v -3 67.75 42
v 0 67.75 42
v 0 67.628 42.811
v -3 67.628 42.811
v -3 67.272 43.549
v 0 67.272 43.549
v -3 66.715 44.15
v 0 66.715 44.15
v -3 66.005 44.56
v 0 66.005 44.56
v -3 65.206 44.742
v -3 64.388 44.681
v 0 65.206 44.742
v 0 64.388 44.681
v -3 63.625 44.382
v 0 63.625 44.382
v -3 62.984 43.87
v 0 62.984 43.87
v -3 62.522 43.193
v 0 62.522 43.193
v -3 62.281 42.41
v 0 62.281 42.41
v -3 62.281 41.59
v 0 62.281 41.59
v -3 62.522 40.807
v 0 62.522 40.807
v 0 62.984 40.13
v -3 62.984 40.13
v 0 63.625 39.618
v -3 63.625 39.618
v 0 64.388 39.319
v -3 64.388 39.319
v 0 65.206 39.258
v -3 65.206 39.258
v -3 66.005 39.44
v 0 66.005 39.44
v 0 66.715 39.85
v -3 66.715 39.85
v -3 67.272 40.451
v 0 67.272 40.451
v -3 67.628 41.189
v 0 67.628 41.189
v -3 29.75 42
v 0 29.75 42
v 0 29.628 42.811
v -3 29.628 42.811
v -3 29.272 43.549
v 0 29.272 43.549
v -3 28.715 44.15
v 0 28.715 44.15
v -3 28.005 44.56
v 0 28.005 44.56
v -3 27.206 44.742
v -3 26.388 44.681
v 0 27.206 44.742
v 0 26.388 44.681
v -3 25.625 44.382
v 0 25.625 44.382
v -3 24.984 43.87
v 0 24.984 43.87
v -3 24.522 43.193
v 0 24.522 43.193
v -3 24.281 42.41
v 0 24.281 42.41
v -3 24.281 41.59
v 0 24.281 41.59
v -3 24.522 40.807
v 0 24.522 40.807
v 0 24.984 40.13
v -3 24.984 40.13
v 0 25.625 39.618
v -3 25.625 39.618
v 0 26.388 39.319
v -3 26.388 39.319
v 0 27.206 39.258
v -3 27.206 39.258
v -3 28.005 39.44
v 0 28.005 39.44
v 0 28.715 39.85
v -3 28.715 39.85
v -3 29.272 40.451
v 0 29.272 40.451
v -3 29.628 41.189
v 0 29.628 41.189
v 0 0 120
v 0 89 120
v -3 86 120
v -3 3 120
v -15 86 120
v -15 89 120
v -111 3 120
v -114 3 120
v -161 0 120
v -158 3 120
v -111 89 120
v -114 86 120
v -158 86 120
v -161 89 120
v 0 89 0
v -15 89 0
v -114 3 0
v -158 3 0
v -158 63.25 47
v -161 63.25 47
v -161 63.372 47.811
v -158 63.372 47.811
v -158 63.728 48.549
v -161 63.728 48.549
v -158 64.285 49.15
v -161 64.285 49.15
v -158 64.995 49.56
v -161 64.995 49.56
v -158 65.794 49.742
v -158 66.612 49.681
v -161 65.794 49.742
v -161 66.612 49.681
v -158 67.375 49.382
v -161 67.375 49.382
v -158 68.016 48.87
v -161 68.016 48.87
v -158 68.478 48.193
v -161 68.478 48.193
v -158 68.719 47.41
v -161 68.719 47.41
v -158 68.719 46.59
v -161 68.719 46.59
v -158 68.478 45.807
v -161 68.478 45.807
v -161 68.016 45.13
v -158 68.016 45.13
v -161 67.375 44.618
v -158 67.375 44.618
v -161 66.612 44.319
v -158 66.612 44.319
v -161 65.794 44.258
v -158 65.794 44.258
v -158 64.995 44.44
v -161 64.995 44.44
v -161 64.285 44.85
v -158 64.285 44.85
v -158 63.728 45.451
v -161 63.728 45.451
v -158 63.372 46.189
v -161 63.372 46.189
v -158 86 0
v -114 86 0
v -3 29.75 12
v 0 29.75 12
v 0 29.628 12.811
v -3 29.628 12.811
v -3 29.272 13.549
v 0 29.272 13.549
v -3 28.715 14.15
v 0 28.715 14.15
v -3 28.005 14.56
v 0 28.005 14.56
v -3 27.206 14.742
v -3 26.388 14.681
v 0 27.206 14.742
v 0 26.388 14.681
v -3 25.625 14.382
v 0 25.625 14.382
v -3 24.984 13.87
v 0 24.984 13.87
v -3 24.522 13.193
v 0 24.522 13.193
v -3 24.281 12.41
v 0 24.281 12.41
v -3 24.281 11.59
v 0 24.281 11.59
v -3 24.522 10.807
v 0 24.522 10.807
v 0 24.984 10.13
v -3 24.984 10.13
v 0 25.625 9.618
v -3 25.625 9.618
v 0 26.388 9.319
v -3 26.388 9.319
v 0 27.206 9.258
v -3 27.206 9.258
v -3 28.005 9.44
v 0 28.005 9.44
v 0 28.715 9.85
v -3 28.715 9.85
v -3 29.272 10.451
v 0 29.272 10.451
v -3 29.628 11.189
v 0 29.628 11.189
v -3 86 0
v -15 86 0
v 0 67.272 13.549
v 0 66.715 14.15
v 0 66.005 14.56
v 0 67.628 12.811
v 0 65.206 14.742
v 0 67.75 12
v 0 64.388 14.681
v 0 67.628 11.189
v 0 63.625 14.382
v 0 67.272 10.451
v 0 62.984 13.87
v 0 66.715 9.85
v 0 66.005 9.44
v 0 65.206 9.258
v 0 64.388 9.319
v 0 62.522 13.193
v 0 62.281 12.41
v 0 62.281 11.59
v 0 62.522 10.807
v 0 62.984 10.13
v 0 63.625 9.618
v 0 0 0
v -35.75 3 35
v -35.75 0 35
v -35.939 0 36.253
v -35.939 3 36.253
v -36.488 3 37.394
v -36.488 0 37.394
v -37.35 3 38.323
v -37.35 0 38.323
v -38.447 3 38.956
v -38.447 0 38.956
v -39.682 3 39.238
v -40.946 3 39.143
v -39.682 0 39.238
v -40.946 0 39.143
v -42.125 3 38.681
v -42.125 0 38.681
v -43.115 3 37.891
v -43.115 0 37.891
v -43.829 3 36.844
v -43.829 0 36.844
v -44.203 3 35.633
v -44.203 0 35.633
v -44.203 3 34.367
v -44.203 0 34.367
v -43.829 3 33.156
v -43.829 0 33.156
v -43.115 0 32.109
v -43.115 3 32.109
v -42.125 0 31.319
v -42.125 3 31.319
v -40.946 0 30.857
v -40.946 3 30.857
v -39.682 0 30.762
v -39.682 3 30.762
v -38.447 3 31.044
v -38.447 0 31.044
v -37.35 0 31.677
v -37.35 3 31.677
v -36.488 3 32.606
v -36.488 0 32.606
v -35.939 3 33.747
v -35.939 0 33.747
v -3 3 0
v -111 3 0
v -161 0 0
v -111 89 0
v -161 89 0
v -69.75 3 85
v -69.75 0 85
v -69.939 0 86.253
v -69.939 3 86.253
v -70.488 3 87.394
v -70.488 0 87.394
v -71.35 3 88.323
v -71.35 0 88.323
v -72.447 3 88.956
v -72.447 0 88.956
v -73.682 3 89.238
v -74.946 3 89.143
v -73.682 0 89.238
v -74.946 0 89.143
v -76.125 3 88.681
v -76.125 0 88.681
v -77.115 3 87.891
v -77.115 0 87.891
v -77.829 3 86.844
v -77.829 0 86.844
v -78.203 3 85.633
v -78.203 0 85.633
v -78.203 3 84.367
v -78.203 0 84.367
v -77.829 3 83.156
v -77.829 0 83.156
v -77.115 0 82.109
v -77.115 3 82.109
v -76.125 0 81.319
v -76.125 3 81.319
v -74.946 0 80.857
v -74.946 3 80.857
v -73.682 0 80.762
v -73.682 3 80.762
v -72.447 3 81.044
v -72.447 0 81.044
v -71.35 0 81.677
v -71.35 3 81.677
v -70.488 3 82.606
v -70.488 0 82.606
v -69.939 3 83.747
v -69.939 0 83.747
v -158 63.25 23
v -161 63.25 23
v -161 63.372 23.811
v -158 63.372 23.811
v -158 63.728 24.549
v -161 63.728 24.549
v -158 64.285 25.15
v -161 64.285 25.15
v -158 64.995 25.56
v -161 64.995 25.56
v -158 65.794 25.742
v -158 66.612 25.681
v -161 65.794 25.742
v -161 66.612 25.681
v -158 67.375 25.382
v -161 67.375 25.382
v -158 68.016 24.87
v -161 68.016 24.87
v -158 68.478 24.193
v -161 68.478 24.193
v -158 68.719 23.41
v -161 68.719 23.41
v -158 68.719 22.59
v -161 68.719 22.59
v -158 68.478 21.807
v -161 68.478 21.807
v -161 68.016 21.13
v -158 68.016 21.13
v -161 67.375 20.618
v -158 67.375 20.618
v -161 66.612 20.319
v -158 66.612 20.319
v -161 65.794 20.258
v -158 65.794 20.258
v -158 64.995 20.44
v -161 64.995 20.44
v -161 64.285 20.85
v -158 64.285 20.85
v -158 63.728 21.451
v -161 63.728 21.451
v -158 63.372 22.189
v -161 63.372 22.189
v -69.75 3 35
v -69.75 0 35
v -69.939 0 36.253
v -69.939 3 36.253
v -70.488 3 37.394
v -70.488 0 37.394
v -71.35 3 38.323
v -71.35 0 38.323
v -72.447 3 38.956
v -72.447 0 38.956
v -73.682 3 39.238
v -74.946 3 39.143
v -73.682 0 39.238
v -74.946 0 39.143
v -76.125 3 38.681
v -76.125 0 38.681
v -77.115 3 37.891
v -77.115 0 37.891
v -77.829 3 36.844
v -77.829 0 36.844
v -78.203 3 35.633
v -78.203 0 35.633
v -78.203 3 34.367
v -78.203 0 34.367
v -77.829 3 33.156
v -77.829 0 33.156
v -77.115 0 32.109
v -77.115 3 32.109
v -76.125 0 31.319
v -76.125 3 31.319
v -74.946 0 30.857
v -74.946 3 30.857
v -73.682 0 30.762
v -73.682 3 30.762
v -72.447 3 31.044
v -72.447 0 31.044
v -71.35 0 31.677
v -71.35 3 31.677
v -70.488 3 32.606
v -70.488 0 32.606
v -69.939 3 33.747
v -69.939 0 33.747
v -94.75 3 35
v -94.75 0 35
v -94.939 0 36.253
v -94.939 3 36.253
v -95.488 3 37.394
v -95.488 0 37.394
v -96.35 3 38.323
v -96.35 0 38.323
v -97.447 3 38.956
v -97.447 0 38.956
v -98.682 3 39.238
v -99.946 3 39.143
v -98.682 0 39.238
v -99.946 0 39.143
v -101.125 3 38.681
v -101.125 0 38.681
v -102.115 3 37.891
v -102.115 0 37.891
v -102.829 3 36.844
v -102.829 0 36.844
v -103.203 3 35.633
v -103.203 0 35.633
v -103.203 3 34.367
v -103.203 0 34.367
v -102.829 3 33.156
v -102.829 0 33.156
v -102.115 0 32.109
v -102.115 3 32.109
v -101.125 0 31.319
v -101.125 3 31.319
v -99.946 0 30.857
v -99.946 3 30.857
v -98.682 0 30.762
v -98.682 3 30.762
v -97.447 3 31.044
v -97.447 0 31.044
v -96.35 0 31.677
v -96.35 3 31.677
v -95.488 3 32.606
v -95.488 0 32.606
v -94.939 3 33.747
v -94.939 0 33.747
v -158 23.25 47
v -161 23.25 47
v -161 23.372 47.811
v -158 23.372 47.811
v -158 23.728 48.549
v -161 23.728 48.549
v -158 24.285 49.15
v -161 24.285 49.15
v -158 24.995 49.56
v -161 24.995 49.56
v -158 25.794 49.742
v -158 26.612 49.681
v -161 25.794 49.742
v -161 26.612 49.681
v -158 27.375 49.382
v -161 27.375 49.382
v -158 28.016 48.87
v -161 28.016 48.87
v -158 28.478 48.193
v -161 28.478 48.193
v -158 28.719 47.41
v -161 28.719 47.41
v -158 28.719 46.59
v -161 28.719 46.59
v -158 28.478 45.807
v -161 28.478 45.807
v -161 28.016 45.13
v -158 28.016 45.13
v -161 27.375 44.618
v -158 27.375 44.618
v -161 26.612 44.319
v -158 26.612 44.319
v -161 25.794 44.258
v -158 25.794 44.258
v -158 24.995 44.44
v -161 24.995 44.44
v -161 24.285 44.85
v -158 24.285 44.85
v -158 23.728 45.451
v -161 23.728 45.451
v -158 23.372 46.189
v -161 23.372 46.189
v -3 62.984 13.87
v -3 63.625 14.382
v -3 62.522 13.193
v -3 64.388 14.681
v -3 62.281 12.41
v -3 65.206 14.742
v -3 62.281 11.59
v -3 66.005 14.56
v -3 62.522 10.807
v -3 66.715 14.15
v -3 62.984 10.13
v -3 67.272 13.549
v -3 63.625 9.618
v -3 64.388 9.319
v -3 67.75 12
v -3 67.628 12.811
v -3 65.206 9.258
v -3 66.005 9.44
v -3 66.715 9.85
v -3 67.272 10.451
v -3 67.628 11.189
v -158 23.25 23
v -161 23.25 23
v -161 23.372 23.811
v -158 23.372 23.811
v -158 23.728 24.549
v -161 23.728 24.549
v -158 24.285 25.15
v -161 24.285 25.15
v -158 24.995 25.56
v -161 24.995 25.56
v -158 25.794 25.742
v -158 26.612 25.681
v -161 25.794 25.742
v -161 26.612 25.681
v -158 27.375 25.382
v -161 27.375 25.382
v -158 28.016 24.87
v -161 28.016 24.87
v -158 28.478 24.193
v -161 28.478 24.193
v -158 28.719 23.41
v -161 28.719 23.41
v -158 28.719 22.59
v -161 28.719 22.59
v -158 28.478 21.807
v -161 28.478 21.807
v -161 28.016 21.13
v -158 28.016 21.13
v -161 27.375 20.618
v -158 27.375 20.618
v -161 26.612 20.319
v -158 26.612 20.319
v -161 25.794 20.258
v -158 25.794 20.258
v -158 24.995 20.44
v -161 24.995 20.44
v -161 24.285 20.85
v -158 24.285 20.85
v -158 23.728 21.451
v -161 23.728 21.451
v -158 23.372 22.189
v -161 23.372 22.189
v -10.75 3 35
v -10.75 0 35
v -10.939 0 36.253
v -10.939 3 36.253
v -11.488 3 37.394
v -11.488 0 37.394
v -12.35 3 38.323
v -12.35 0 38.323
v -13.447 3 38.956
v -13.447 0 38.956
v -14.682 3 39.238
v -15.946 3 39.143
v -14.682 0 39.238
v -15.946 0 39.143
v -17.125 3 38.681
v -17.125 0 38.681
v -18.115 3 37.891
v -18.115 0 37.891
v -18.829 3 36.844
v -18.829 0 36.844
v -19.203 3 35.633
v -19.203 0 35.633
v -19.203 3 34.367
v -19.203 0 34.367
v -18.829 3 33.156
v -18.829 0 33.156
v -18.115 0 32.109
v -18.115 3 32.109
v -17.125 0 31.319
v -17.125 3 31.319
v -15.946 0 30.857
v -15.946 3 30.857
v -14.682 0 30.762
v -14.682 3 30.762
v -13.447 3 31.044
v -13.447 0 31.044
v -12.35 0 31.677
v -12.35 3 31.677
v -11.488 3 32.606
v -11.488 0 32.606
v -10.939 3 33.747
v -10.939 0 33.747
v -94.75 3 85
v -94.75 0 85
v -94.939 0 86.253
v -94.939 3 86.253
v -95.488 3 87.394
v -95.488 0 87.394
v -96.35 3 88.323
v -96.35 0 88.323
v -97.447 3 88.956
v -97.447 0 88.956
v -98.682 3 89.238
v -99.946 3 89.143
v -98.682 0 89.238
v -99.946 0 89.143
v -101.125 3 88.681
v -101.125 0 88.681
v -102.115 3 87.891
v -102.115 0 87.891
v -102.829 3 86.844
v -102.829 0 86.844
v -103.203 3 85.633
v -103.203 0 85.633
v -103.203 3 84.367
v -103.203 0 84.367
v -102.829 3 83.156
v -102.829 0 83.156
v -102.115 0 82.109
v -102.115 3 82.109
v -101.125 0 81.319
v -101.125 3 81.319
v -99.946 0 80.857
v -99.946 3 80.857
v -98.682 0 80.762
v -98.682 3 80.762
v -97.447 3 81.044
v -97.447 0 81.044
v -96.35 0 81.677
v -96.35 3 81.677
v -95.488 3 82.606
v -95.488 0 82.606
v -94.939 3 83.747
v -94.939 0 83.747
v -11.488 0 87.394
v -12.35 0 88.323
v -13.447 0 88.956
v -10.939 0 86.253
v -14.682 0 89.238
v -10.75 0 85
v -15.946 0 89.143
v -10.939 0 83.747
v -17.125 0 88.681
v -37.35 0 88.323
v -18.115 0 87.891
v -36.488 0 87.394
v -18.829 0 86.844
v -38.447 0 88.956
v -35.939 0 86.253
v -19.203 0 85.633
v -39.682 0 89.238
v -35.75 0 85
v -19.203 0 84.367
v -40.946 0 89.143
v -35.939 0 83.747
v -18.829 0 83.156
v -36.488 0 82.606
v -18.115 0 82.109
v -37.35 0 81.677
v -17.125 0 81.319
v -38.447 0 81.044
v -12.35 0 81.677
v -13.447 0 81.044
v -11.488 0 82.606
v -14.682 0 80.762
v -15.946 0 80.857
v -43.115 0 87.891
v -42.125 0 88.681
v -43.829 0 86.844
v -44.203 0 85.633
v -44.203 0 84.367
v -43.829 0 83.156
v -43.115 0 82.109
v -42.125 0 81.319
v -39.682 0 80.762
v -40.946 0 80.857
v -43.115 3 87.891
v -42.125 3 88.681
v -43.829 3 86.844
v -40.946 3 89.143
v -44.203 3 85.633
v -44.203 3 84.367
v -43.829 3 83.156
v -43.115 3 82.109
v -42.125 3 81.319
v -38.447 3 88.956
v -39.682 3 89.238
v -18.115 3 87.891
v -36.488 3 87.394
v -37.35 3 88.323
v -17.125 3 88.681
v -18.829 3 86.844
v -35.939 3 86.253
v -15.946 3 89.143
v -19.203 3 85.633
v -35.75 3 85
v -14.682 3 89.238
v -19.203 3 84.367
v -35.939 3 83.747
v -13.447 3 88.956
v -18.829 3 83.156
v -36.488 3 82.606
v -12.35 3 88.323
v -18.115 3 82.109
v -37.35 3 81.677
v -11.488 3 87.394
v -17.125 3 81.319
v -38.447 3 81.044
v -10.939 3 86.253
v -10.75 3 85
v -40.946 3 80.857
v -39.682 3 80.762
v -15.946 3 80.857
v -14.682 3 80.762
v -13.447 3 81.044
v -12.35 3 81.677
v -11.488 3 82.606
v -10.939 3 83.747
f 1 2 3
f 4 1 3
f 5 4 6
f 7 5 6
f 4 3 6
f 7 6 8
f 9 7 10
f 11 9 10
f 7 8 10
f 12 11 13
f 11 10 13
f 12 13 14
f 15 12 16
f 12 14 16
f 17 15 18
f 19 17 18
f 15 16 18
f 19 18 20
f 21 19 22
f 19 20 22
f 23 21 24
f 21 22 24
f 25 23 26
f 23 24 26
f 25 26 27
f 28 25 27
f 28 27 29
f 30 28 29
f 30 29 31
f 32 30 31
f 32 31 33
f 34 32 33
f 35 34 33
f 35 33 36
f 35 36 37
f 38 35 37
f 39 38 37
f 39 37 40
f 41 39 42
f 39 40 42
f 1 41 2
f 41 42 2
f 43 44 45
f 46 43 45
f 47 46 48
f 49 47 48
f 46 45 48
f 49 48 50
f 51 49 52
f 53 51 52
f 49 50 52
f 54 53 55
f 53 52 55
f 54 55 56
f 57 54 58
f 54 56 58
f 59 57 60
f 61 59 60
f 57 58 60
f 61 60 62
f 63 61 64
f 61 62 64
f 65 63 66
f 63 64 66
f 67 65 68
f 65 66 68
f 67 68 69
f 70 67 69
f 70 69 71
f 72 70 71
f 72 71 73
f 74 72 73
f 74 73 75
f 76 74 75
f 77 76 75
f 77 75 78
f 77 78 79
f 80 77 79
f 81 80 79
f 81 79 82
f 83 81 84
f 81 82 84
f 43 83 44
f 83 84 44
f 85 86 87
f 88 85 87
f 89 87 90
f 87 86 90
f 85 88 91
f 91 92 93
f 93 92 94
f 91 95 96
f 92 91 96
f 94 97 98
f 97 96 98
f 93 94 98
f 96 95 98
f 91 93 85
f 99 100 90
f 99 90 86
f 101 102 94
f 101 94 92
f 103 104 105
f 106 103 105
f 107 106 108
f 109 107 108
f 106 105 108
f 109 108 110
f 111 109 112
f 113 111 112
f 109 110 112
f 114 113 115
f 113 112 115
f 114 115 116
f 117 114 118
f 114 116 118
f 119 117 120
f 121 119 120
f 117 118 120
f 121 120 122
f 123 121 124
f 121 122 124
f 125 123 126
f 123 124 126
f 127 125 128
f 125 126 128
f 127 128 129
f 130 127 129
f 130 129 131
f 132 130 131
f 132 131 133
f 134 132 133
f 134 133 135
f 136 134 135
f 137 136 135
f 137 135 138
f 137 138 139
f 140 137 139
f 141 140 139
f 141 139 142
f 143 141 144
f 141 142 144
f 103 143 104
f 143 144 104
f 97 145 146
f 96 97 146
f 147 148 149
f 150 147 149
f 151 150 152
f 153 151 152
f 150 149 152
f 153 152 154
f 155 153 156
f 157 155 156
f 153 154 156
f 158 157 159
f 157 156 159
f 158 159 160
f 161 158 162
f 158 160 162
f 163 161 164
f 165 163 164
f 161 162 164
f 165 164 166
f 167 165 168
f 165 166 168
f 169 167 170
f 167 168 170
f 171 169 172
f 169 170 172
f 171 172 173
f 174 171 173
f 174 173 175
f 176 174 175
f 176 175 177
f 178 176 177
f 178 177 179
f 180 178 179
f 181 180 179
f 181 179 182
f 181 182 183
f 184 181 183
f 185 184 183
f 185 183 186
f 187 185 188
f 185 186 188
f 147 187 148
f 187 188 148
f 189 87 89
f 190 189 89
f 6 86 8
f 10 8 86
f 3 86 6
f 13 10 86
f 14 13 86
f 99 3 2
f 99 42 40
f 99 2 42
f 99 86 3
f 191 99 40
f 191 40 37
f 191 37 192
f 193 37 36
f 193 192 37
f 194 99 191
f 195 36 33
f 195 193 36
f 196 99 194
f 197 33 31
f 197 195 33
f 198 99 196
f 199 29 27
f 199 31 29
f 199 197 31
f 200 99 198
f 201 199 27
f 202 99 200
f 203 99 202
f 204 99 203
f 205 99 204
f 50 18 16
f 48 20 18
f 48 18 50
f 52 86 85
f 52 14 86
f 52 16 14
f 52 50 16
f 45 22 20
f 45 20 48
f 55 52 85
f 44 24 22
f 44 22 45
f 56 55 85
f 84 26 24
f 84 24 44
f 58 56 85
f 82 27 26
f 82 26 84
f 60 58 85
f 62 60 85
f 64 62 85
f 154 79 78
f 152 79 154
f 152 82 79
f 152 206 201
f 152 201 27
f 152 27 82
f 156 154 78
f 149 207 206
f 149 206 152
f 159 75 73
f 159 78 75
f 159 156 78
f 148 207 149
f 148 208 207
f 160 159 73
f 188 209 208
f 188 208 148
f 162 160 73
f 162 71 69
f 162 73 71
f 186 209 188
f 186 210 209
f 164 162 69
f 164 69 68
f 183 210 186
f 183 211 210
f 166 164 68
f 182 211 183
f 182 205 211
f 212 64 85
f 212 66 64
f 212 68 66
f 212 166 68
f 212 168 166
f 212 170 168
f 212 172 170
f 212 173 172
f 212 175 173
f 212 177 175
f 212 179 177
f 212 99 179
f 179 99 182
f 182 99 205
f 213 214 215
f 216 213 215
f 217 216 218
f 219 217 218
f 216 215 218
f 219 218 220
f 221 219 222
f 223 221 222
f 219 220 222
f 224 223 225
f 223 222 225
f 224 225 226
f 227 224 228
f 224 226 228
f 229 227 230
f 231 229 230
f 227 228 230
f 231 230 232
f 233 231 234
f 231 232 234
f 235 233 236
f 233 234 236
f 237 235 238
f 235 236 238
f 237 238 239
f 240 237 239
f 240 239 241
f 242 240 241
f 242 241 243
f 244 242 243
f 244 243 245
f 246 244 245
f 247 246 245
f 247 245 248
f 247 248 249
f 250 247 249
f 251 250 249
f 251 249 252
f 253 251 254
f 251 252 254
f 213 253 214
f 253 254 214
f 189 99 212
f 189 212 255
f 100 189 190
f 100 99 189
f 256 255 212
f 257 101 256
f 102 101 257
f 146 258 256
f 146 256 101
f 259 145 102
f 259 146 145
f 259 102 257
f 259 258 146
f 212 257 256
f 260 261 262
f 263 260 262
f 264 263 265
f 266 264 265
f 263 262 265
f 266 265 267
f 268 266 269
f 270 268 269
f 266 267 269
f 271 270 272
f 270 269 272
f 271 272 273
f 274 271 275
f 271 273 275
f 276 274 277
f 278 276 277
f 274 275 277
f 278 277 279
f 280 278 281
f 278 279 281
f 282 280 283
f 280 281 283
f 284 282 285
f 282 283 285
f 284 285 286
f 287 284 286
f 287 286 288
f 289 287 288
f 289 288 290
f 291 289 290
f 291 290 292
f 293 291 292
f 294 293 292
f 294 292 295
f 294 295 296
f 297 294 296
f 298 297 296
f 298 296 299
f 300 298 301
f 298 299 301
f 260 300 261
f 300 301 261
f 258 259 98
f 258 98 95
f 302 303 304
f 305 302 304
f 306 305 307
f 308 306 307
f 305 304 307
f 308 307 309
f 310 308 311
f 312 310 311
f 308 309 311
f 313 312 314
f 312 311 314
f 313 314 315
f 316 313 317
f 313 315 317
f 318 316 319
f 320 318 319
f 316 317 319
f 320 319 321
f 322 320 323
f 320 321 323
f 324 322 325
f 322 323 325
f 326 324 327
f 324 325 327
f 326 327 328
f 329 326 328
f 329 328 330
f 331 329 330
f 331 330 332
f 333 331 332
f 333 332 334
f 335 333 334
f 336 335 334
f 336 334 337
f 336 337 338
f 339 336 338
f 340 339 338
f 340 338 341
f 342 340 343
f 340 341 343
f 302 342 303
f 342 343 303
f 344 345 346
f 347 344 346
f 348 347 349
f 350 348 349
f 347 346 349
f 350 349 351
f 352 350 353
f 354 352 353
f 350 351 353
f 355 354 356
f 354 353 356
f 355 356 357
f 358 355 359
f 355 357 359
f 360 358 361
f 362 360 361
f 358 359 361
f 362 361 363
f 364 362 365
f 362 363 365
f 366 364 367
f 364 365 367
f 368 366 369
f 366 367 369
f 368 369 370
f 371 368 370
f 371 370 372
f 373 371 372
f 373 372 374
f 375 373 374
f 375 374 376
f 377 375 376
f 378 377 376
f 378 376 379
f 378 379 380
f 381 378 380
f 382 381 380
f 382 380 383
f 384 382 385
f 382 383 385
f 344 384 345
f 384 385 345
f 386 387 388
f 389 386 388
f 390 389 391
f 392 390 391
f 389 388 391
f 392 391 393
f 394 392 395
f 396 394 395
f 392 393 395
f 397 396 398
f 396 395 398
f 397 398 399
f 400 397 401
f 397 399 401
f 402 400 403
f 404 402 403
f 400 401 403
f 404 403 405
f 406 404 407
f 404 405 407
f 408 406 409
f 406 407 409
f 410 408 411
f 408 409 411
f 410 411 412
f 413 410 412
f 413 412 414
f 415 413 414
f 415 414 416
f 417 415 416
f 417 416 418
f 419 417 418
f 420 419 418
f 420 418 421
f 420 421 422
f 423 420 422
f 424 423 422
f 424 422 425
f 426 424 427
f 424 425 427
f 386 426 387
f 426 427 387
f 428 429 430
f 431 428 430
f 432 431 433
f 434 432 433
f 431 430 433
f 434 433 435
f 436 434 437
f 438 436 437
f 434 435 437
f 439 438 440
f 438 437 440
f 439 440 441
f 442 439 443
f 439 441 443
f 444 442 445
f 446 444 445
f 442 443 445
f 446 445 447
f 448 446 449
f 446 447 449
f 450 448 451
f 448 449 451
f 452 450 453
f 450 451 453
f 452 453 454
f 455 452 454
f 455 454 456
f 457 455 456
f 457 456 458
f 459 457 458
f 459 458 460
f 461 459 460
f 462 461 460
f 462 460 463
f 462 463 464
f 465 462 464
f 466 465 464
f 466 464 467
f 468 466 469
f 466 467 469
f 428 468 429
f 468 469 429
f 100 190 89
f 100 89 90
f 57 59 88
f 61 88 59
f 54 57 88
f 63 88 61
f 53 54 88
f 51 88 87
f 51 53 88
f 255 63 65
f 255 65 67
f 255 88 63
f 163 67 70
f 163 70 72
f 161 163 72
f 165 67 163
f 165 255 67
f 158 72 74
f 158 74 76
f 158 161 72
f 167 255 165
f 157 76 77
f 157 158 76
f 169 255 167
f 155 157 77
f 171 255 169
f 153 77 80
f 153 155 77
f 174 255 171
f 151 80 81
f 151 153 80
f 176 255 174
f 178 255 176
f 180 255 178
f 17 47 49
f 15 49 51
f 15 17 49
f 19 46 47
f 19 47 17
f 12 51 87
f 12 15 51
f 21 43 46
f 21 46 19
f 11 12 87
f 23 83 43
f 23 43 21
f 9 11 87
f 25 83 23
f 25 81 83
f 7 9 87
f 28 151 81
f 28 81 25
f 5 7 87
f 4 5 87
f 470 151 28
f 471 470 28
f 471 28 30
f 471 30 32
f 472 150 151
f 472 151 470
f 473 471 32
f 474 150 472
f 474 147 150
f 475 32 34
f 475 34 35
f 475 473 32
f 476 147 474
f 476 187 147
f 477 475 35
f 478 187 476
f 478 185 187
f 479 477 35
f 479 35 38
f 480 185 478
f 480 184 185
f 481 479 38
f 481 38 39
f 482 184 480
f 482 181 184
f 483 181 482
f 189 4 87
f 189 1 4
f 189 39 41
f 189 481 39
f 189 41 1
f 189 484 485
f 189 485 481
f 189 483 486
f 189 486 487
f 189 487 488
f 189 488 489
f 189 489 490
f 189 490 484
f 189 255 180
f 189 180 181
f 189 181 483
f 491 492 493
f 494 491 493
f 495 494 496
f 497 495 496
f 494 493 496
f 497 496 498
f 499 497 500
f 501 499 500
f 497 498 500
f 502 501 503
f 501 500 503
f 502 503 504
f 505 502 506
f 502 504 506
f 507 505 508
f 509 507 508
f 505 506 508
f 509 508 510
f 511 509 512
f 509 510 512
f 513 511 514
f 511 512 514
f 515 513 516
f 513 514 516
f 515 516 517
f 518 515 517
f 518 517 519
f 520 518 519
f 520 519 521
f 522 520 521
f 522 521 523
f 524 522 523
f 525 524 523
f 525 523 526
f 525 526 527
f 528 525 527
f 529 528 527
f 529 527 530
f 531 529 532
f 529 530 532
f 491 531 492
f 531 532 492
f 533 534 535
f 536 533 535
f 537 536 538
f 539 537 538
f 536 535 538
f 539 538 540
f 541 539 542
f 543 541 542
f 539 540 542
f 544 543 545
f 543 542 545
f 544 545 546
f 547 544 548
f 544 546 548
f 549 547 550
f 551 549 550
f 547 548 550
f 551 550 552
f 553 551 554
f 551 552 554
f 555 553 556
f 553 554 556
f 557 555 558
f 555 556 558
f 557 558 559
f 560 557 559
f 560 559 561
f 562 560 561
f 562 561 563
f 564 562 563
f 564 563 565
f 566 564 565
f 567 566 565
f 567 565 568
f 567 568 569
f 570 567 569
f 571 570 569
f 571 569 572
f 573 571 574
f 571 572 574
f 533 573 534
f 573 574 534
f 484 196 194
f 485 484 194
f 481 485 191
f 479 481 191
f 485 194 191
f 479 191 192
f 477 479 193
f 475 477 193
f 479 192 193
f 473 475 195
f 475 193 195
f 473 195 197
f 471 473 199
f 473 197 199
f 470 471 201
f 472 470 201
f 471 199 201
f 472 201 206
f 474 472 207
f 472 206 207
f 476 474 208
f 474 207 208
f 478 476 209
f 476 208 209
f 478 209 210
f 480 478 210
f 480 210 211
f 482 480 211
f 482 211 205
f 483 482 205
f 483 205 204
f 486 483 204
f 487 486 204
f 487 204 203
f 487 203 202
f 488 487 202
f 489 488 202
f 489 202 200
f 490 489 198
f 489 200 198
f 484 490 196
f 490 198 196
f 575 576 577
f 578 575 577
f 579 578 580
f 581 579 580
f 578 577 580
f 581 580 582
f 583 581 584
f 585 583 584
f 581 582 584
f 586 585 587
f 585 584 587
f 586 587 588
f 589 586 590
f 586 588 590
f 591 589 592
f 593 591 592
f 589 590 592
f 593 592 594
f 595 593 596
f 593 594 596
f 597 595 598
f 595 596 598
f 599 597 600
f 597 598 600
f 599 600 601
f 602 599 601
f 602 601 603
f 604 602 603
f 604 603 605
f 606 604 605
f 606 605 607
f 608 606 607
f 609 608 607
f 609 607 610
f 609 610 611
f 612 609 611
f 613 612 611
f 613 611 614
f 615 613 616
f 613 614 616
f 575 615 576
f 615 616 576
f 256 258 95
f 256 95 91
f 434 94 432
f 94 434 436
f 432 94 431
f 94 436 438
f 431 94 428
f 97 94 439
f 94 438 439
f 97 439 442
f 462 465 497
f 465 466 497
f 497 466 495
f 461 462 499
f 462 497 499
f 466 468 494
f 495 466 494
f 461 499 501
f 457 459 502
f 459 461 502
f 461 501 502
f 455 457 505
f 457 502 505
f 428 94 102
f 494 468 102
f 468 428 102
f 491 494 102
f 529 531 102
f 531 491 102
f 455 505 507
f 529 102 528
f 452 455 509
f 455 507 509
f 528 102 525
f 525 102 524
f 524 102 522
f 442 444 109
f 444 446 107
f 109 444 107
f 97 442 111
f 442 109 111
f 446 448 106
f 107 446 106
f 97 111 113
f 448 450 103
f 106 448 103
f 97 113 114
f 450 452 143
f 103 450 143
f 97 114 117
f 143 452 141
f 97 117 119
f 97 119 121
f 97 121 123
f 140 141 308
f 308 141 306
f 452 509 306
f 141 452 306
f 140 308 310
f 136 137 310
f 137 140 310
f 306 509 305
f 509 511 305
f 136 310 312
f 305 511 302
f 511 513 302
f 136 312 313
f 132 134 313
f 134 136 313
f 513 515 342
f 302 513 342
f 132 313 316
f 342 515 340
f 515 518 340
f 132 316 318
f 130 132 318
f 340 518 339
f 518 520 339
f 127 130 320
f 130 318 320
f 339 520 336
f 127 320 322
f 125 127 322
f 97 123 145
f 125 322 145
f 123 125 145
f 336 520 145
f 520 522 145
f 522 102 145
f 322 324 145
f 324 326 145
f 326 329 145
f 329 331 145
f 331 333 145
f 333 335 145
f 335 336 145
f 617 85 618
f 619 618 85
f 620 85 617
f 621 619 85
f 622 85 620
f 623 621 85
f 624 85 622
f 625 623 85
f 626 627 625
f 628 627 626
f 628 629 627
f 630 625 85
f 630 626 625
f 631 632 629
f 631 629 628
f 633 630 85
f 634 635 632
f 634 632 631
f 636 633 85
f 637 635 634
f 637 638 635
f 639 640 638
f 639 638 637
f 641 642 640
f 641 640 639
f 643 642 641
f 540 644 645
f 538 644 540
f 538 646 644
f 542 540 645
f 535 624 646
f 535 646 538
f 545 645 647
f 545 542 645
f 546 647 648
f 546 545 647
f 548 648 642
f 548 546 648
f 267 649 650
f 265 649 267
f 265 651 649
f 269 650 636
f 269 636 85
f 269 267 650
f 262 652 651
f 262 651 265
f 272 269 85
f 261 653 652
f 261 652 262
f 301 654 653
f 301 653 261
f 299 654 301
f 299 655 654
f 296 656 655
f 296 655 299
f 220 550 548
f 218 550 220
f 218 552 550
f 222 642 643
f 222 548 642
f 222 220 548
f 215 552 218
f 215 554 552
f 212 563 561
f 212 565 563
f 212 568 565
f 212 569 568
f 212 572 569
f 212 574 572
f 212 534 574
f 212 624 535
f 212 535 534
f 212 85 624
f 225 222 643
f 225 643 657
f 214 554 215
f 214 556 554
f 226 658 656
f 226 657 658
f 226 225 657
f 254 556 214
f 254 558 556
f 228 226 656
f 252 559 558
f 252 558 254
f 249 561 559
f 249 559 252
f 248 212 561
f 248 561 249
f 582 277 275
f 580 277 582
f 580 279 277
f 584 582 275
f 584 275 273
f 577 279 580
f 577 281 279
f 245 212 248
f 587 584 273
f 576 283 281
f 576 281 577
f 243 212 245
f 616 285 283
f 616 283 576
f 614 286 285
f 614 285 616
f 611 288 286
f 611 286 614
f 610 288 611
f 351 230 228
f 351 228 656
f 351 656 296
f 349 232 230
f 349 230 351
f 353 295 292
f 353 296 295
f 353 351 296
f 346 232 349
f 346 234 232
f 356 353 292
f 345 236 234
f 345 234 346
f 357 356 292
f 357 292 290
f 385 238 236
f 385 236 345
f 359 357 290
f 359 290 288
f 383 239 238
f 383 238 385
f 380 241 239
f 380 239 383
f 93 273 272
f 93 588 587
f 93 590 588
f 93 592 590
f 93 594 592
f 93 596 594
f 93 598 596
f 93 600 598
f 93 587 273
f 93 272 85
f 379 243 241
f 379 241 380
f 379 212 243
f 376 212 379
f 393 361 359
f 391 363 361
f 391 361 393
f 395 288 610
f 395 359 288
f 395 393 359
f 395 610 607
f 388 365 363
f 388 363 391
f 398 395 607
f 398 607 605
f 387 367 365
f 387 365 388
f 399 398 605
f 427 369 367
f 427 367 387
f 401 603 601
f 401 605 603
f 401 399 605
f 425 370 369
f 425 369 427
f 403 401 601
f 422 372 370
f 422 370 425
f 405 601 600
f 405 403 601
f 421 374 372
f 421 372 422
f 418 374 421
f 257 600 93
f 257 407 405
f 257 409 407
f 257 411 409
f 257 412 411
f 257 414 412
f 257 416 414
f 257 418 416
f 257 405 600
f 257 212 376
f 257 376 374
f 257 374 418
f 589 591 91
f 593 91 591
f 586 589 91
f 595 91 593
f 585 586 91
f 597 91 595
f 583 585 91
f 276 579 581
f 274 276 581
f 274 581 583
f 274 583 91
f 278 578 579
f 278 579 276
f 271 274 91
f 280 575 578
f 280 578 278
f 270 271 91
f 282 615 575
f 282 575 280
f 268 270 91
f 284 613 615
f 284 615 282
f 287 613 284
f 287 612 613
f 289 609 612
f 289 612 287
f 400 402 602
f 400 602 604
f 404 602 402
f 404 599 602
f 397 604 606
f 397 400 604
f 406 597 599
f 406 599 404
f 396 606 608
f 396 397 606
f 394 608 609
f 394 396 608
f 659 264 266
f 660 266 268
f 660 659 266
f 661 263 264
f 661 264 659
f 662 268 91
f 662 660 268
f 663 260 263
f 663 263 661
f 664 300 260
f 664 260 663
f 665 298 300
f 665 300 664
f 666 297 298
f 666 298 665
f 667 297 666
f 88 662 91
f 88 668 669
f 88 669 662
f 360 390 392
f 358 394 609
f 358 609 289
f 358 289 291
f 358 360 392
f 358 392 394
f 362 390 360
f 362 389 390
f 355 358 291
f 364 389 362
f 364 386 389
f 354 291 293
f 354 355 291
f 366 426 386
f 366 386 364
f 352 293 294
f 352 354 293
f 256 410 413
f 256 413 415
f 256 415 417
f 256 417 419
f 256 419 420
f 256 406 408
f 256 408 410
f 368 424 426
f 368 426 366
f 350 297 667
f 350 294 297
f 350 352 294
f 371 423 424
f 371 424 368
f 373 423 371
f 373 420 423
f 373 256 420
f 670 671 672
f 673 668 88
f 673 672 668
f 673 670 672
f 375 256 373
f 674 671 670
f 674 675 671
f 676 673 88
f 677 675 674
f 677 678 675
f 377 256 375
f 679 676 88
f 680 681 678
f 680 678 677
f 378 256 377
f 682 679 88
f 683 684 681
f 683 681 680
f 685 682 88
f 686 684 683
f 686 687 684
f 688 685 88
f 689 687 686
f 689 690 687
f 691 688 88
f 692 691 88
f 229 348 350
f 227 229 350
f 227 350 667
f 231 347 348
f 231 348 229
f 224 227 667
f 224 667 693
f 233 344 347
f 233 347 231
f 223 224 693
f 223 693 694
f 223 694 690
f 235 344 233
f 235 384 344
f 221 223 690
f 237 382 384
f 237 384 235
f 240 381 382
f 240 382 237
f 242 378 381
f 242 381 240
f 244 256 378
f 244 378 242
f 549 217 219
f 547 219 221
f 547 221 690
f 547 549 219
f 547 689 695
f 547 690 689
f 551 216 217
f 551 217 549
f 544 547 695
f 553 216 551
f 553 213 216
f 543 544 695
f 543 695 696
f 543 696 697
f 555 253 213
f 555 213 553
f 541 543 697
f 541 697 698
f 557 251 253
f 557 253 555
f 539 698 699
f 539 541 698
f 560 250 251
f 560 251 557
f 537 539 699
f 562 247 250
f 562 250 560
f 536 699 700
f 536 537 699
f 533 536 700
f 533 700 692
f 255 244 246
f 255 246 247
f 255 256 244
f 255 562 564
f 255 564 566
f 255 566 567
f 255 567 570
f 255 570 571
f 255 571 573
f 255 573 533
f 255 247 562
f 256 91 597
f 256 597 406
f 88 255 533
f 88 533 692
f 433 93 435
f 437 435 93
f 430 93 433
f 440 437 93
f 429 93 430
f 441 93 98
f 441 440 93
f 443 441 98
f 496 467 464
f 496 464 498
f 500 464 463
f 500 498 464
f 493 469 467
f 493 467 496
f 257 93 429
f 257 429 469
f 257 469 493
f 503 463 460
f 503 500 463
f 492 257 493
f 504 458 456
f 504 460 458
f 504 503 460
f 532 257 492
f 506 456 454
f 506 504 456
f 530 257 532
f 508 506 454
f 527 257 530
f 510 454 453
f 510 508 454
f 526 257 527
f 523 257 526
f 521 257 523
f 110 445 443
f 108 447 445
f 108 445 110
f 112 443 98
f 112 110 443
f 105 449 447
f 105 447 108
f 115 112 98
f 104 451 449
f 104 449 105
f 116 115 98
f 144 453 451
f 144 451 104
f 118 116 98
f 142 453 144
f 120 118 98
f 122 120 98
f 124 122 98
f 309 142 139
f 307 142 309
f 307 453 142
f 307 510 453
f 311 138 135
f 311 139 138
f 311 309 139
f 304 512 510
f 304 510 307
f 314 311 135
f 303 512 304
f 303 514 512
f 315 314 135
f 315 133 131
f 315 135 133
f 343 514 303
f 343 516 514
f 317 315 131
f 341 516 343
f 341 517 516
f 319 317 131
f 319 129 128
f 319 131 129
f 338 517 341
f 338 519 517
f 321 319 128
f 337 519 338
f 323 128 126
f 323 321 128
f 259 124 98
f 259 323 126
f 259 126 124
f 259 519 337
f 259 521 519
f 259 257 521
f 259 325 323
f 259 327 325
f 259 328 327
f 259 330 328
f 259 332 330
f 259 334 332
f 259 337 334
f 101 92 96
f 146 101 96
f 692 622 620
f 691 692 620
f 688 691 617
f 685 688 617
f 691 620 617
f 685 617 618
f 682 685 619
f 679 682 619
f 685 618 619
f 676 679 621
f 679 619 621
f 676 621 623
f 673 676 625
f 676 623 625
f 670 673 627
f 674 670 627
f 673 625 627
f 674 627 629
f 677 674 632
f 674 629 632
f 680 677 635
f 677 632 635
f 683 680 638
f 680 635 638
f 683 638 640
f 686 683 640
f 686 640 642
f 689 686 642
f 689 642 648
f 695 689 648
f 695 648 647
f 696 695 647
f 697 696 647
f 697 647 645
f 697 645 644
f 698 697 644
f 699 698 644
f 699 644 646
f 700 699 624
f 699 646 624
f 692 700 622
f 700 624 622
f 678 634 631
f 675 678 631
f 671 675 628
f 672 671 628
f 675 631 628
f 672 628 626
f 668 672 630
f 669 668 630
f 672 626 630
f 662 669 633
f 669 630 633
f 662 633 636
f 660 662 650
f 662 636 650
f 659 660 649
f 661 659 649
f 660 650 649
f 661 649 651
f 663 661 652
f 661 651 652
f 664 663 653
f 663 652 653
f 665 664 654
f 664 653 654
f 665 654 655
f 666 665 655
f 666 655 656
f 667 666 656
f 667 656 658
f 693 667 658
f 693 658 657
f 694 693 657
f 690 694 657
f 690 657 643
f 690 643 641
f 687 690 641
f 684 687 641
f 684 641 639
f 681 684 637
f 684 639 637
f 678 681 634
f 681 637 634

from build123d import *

# Parameters (mm, degrees)
SKETCH_W        = 44
SKETCH_H        = 83
PAD_DEPTH       = 120
SKETCH001_R     = 2.75
POCKET_DEPTH    = 3
SKETCH002_R     = 4.25
POCKET001_DEPTH = 3
SKETCH003_R     = 2.75
POCKET002_DEPTH = 3


with BuildPart() as part:
    # Sketch → Pad (new body)
    with BuildSketch(Plane.XY):
        Polygon((0, 0), (-161, 0), (-161, 89), (-111, 89), (-111, 3), (-3, 3), (-3, 86), (-15, 86), (-15, 89), (0, 89), align=None)
        with Locations((-136, 44.5)):
            Rectangle(SKETCH_W, SKETCH_H, mode=Mode.SUBTRACT)
    extrude(amount=PAD_DEPTH)

    # Sketch001 (on Face2 of Pad) → Pocket (cut)
    with BuildSketch(Plane.YZ):
        with Locations((27, 42)):
            Circle(SKETCH001_R)
        with Locations((65, 42)):
            Circle(SKETCH001_R)
        with Locations((27, 12)):
            Circle(SKETCH001_R)
        with Locations((65, 12)):
            Circle(SKETCH001_R)
    extrude(amount=-POCKET_DEPTH, mode=Mode.SUBTRACT)

    # Sketch002 (on Face6 of Pocket) → Pocket001 (cut)
    with BuildSketch(Plane.XZ):
        with Locations((-40, 85)):
            Circle(SKETCH002_R)
        with Locations((-15, 85)):
            Circle(SKETCH002_R)
        with Locations((-40, 35)):
            Circle(SKETCH002_R)
        with Locations((-15, 35)):
            Circle(SKETCH002_R)
        with Locations((-99, 85)):
            Circle(SKETCH002_R)
        with Locations((-74, 85)):
            Circle(SKETCH002_R)
        with Locations((-99, 35)):
            Circle(SKETCH002_R)
        with Locations((-74, 35)):
            Circle(SKETCH002_R)
    extrude(amount=-POCKET001_DEPTH, mode=Mode.SUBTRACT)

    # Sketch003 (on Face12 of Pocket001) → Pocket002 (cut)
    with BuildSketch(Plane(origin=(-161, 0, 0), x_dir=(0, -1, 0), z_dir=(-1, 0, 0))):
        with Locations((-66, 47)):
            Circle(SKETCH003_R)
        with Locations((-26, 47)):
            Circle(SKETCH003_R)
        with Locations((-66, 23)):
            Circle(SKETCH003_R)
        with Locations((-26, 23)):
            Circle(SKETCH003_R)
    extrude(amount=-POCKET002_DEPTH, mode=Mode.SUBTRACT)


solid = part.part
